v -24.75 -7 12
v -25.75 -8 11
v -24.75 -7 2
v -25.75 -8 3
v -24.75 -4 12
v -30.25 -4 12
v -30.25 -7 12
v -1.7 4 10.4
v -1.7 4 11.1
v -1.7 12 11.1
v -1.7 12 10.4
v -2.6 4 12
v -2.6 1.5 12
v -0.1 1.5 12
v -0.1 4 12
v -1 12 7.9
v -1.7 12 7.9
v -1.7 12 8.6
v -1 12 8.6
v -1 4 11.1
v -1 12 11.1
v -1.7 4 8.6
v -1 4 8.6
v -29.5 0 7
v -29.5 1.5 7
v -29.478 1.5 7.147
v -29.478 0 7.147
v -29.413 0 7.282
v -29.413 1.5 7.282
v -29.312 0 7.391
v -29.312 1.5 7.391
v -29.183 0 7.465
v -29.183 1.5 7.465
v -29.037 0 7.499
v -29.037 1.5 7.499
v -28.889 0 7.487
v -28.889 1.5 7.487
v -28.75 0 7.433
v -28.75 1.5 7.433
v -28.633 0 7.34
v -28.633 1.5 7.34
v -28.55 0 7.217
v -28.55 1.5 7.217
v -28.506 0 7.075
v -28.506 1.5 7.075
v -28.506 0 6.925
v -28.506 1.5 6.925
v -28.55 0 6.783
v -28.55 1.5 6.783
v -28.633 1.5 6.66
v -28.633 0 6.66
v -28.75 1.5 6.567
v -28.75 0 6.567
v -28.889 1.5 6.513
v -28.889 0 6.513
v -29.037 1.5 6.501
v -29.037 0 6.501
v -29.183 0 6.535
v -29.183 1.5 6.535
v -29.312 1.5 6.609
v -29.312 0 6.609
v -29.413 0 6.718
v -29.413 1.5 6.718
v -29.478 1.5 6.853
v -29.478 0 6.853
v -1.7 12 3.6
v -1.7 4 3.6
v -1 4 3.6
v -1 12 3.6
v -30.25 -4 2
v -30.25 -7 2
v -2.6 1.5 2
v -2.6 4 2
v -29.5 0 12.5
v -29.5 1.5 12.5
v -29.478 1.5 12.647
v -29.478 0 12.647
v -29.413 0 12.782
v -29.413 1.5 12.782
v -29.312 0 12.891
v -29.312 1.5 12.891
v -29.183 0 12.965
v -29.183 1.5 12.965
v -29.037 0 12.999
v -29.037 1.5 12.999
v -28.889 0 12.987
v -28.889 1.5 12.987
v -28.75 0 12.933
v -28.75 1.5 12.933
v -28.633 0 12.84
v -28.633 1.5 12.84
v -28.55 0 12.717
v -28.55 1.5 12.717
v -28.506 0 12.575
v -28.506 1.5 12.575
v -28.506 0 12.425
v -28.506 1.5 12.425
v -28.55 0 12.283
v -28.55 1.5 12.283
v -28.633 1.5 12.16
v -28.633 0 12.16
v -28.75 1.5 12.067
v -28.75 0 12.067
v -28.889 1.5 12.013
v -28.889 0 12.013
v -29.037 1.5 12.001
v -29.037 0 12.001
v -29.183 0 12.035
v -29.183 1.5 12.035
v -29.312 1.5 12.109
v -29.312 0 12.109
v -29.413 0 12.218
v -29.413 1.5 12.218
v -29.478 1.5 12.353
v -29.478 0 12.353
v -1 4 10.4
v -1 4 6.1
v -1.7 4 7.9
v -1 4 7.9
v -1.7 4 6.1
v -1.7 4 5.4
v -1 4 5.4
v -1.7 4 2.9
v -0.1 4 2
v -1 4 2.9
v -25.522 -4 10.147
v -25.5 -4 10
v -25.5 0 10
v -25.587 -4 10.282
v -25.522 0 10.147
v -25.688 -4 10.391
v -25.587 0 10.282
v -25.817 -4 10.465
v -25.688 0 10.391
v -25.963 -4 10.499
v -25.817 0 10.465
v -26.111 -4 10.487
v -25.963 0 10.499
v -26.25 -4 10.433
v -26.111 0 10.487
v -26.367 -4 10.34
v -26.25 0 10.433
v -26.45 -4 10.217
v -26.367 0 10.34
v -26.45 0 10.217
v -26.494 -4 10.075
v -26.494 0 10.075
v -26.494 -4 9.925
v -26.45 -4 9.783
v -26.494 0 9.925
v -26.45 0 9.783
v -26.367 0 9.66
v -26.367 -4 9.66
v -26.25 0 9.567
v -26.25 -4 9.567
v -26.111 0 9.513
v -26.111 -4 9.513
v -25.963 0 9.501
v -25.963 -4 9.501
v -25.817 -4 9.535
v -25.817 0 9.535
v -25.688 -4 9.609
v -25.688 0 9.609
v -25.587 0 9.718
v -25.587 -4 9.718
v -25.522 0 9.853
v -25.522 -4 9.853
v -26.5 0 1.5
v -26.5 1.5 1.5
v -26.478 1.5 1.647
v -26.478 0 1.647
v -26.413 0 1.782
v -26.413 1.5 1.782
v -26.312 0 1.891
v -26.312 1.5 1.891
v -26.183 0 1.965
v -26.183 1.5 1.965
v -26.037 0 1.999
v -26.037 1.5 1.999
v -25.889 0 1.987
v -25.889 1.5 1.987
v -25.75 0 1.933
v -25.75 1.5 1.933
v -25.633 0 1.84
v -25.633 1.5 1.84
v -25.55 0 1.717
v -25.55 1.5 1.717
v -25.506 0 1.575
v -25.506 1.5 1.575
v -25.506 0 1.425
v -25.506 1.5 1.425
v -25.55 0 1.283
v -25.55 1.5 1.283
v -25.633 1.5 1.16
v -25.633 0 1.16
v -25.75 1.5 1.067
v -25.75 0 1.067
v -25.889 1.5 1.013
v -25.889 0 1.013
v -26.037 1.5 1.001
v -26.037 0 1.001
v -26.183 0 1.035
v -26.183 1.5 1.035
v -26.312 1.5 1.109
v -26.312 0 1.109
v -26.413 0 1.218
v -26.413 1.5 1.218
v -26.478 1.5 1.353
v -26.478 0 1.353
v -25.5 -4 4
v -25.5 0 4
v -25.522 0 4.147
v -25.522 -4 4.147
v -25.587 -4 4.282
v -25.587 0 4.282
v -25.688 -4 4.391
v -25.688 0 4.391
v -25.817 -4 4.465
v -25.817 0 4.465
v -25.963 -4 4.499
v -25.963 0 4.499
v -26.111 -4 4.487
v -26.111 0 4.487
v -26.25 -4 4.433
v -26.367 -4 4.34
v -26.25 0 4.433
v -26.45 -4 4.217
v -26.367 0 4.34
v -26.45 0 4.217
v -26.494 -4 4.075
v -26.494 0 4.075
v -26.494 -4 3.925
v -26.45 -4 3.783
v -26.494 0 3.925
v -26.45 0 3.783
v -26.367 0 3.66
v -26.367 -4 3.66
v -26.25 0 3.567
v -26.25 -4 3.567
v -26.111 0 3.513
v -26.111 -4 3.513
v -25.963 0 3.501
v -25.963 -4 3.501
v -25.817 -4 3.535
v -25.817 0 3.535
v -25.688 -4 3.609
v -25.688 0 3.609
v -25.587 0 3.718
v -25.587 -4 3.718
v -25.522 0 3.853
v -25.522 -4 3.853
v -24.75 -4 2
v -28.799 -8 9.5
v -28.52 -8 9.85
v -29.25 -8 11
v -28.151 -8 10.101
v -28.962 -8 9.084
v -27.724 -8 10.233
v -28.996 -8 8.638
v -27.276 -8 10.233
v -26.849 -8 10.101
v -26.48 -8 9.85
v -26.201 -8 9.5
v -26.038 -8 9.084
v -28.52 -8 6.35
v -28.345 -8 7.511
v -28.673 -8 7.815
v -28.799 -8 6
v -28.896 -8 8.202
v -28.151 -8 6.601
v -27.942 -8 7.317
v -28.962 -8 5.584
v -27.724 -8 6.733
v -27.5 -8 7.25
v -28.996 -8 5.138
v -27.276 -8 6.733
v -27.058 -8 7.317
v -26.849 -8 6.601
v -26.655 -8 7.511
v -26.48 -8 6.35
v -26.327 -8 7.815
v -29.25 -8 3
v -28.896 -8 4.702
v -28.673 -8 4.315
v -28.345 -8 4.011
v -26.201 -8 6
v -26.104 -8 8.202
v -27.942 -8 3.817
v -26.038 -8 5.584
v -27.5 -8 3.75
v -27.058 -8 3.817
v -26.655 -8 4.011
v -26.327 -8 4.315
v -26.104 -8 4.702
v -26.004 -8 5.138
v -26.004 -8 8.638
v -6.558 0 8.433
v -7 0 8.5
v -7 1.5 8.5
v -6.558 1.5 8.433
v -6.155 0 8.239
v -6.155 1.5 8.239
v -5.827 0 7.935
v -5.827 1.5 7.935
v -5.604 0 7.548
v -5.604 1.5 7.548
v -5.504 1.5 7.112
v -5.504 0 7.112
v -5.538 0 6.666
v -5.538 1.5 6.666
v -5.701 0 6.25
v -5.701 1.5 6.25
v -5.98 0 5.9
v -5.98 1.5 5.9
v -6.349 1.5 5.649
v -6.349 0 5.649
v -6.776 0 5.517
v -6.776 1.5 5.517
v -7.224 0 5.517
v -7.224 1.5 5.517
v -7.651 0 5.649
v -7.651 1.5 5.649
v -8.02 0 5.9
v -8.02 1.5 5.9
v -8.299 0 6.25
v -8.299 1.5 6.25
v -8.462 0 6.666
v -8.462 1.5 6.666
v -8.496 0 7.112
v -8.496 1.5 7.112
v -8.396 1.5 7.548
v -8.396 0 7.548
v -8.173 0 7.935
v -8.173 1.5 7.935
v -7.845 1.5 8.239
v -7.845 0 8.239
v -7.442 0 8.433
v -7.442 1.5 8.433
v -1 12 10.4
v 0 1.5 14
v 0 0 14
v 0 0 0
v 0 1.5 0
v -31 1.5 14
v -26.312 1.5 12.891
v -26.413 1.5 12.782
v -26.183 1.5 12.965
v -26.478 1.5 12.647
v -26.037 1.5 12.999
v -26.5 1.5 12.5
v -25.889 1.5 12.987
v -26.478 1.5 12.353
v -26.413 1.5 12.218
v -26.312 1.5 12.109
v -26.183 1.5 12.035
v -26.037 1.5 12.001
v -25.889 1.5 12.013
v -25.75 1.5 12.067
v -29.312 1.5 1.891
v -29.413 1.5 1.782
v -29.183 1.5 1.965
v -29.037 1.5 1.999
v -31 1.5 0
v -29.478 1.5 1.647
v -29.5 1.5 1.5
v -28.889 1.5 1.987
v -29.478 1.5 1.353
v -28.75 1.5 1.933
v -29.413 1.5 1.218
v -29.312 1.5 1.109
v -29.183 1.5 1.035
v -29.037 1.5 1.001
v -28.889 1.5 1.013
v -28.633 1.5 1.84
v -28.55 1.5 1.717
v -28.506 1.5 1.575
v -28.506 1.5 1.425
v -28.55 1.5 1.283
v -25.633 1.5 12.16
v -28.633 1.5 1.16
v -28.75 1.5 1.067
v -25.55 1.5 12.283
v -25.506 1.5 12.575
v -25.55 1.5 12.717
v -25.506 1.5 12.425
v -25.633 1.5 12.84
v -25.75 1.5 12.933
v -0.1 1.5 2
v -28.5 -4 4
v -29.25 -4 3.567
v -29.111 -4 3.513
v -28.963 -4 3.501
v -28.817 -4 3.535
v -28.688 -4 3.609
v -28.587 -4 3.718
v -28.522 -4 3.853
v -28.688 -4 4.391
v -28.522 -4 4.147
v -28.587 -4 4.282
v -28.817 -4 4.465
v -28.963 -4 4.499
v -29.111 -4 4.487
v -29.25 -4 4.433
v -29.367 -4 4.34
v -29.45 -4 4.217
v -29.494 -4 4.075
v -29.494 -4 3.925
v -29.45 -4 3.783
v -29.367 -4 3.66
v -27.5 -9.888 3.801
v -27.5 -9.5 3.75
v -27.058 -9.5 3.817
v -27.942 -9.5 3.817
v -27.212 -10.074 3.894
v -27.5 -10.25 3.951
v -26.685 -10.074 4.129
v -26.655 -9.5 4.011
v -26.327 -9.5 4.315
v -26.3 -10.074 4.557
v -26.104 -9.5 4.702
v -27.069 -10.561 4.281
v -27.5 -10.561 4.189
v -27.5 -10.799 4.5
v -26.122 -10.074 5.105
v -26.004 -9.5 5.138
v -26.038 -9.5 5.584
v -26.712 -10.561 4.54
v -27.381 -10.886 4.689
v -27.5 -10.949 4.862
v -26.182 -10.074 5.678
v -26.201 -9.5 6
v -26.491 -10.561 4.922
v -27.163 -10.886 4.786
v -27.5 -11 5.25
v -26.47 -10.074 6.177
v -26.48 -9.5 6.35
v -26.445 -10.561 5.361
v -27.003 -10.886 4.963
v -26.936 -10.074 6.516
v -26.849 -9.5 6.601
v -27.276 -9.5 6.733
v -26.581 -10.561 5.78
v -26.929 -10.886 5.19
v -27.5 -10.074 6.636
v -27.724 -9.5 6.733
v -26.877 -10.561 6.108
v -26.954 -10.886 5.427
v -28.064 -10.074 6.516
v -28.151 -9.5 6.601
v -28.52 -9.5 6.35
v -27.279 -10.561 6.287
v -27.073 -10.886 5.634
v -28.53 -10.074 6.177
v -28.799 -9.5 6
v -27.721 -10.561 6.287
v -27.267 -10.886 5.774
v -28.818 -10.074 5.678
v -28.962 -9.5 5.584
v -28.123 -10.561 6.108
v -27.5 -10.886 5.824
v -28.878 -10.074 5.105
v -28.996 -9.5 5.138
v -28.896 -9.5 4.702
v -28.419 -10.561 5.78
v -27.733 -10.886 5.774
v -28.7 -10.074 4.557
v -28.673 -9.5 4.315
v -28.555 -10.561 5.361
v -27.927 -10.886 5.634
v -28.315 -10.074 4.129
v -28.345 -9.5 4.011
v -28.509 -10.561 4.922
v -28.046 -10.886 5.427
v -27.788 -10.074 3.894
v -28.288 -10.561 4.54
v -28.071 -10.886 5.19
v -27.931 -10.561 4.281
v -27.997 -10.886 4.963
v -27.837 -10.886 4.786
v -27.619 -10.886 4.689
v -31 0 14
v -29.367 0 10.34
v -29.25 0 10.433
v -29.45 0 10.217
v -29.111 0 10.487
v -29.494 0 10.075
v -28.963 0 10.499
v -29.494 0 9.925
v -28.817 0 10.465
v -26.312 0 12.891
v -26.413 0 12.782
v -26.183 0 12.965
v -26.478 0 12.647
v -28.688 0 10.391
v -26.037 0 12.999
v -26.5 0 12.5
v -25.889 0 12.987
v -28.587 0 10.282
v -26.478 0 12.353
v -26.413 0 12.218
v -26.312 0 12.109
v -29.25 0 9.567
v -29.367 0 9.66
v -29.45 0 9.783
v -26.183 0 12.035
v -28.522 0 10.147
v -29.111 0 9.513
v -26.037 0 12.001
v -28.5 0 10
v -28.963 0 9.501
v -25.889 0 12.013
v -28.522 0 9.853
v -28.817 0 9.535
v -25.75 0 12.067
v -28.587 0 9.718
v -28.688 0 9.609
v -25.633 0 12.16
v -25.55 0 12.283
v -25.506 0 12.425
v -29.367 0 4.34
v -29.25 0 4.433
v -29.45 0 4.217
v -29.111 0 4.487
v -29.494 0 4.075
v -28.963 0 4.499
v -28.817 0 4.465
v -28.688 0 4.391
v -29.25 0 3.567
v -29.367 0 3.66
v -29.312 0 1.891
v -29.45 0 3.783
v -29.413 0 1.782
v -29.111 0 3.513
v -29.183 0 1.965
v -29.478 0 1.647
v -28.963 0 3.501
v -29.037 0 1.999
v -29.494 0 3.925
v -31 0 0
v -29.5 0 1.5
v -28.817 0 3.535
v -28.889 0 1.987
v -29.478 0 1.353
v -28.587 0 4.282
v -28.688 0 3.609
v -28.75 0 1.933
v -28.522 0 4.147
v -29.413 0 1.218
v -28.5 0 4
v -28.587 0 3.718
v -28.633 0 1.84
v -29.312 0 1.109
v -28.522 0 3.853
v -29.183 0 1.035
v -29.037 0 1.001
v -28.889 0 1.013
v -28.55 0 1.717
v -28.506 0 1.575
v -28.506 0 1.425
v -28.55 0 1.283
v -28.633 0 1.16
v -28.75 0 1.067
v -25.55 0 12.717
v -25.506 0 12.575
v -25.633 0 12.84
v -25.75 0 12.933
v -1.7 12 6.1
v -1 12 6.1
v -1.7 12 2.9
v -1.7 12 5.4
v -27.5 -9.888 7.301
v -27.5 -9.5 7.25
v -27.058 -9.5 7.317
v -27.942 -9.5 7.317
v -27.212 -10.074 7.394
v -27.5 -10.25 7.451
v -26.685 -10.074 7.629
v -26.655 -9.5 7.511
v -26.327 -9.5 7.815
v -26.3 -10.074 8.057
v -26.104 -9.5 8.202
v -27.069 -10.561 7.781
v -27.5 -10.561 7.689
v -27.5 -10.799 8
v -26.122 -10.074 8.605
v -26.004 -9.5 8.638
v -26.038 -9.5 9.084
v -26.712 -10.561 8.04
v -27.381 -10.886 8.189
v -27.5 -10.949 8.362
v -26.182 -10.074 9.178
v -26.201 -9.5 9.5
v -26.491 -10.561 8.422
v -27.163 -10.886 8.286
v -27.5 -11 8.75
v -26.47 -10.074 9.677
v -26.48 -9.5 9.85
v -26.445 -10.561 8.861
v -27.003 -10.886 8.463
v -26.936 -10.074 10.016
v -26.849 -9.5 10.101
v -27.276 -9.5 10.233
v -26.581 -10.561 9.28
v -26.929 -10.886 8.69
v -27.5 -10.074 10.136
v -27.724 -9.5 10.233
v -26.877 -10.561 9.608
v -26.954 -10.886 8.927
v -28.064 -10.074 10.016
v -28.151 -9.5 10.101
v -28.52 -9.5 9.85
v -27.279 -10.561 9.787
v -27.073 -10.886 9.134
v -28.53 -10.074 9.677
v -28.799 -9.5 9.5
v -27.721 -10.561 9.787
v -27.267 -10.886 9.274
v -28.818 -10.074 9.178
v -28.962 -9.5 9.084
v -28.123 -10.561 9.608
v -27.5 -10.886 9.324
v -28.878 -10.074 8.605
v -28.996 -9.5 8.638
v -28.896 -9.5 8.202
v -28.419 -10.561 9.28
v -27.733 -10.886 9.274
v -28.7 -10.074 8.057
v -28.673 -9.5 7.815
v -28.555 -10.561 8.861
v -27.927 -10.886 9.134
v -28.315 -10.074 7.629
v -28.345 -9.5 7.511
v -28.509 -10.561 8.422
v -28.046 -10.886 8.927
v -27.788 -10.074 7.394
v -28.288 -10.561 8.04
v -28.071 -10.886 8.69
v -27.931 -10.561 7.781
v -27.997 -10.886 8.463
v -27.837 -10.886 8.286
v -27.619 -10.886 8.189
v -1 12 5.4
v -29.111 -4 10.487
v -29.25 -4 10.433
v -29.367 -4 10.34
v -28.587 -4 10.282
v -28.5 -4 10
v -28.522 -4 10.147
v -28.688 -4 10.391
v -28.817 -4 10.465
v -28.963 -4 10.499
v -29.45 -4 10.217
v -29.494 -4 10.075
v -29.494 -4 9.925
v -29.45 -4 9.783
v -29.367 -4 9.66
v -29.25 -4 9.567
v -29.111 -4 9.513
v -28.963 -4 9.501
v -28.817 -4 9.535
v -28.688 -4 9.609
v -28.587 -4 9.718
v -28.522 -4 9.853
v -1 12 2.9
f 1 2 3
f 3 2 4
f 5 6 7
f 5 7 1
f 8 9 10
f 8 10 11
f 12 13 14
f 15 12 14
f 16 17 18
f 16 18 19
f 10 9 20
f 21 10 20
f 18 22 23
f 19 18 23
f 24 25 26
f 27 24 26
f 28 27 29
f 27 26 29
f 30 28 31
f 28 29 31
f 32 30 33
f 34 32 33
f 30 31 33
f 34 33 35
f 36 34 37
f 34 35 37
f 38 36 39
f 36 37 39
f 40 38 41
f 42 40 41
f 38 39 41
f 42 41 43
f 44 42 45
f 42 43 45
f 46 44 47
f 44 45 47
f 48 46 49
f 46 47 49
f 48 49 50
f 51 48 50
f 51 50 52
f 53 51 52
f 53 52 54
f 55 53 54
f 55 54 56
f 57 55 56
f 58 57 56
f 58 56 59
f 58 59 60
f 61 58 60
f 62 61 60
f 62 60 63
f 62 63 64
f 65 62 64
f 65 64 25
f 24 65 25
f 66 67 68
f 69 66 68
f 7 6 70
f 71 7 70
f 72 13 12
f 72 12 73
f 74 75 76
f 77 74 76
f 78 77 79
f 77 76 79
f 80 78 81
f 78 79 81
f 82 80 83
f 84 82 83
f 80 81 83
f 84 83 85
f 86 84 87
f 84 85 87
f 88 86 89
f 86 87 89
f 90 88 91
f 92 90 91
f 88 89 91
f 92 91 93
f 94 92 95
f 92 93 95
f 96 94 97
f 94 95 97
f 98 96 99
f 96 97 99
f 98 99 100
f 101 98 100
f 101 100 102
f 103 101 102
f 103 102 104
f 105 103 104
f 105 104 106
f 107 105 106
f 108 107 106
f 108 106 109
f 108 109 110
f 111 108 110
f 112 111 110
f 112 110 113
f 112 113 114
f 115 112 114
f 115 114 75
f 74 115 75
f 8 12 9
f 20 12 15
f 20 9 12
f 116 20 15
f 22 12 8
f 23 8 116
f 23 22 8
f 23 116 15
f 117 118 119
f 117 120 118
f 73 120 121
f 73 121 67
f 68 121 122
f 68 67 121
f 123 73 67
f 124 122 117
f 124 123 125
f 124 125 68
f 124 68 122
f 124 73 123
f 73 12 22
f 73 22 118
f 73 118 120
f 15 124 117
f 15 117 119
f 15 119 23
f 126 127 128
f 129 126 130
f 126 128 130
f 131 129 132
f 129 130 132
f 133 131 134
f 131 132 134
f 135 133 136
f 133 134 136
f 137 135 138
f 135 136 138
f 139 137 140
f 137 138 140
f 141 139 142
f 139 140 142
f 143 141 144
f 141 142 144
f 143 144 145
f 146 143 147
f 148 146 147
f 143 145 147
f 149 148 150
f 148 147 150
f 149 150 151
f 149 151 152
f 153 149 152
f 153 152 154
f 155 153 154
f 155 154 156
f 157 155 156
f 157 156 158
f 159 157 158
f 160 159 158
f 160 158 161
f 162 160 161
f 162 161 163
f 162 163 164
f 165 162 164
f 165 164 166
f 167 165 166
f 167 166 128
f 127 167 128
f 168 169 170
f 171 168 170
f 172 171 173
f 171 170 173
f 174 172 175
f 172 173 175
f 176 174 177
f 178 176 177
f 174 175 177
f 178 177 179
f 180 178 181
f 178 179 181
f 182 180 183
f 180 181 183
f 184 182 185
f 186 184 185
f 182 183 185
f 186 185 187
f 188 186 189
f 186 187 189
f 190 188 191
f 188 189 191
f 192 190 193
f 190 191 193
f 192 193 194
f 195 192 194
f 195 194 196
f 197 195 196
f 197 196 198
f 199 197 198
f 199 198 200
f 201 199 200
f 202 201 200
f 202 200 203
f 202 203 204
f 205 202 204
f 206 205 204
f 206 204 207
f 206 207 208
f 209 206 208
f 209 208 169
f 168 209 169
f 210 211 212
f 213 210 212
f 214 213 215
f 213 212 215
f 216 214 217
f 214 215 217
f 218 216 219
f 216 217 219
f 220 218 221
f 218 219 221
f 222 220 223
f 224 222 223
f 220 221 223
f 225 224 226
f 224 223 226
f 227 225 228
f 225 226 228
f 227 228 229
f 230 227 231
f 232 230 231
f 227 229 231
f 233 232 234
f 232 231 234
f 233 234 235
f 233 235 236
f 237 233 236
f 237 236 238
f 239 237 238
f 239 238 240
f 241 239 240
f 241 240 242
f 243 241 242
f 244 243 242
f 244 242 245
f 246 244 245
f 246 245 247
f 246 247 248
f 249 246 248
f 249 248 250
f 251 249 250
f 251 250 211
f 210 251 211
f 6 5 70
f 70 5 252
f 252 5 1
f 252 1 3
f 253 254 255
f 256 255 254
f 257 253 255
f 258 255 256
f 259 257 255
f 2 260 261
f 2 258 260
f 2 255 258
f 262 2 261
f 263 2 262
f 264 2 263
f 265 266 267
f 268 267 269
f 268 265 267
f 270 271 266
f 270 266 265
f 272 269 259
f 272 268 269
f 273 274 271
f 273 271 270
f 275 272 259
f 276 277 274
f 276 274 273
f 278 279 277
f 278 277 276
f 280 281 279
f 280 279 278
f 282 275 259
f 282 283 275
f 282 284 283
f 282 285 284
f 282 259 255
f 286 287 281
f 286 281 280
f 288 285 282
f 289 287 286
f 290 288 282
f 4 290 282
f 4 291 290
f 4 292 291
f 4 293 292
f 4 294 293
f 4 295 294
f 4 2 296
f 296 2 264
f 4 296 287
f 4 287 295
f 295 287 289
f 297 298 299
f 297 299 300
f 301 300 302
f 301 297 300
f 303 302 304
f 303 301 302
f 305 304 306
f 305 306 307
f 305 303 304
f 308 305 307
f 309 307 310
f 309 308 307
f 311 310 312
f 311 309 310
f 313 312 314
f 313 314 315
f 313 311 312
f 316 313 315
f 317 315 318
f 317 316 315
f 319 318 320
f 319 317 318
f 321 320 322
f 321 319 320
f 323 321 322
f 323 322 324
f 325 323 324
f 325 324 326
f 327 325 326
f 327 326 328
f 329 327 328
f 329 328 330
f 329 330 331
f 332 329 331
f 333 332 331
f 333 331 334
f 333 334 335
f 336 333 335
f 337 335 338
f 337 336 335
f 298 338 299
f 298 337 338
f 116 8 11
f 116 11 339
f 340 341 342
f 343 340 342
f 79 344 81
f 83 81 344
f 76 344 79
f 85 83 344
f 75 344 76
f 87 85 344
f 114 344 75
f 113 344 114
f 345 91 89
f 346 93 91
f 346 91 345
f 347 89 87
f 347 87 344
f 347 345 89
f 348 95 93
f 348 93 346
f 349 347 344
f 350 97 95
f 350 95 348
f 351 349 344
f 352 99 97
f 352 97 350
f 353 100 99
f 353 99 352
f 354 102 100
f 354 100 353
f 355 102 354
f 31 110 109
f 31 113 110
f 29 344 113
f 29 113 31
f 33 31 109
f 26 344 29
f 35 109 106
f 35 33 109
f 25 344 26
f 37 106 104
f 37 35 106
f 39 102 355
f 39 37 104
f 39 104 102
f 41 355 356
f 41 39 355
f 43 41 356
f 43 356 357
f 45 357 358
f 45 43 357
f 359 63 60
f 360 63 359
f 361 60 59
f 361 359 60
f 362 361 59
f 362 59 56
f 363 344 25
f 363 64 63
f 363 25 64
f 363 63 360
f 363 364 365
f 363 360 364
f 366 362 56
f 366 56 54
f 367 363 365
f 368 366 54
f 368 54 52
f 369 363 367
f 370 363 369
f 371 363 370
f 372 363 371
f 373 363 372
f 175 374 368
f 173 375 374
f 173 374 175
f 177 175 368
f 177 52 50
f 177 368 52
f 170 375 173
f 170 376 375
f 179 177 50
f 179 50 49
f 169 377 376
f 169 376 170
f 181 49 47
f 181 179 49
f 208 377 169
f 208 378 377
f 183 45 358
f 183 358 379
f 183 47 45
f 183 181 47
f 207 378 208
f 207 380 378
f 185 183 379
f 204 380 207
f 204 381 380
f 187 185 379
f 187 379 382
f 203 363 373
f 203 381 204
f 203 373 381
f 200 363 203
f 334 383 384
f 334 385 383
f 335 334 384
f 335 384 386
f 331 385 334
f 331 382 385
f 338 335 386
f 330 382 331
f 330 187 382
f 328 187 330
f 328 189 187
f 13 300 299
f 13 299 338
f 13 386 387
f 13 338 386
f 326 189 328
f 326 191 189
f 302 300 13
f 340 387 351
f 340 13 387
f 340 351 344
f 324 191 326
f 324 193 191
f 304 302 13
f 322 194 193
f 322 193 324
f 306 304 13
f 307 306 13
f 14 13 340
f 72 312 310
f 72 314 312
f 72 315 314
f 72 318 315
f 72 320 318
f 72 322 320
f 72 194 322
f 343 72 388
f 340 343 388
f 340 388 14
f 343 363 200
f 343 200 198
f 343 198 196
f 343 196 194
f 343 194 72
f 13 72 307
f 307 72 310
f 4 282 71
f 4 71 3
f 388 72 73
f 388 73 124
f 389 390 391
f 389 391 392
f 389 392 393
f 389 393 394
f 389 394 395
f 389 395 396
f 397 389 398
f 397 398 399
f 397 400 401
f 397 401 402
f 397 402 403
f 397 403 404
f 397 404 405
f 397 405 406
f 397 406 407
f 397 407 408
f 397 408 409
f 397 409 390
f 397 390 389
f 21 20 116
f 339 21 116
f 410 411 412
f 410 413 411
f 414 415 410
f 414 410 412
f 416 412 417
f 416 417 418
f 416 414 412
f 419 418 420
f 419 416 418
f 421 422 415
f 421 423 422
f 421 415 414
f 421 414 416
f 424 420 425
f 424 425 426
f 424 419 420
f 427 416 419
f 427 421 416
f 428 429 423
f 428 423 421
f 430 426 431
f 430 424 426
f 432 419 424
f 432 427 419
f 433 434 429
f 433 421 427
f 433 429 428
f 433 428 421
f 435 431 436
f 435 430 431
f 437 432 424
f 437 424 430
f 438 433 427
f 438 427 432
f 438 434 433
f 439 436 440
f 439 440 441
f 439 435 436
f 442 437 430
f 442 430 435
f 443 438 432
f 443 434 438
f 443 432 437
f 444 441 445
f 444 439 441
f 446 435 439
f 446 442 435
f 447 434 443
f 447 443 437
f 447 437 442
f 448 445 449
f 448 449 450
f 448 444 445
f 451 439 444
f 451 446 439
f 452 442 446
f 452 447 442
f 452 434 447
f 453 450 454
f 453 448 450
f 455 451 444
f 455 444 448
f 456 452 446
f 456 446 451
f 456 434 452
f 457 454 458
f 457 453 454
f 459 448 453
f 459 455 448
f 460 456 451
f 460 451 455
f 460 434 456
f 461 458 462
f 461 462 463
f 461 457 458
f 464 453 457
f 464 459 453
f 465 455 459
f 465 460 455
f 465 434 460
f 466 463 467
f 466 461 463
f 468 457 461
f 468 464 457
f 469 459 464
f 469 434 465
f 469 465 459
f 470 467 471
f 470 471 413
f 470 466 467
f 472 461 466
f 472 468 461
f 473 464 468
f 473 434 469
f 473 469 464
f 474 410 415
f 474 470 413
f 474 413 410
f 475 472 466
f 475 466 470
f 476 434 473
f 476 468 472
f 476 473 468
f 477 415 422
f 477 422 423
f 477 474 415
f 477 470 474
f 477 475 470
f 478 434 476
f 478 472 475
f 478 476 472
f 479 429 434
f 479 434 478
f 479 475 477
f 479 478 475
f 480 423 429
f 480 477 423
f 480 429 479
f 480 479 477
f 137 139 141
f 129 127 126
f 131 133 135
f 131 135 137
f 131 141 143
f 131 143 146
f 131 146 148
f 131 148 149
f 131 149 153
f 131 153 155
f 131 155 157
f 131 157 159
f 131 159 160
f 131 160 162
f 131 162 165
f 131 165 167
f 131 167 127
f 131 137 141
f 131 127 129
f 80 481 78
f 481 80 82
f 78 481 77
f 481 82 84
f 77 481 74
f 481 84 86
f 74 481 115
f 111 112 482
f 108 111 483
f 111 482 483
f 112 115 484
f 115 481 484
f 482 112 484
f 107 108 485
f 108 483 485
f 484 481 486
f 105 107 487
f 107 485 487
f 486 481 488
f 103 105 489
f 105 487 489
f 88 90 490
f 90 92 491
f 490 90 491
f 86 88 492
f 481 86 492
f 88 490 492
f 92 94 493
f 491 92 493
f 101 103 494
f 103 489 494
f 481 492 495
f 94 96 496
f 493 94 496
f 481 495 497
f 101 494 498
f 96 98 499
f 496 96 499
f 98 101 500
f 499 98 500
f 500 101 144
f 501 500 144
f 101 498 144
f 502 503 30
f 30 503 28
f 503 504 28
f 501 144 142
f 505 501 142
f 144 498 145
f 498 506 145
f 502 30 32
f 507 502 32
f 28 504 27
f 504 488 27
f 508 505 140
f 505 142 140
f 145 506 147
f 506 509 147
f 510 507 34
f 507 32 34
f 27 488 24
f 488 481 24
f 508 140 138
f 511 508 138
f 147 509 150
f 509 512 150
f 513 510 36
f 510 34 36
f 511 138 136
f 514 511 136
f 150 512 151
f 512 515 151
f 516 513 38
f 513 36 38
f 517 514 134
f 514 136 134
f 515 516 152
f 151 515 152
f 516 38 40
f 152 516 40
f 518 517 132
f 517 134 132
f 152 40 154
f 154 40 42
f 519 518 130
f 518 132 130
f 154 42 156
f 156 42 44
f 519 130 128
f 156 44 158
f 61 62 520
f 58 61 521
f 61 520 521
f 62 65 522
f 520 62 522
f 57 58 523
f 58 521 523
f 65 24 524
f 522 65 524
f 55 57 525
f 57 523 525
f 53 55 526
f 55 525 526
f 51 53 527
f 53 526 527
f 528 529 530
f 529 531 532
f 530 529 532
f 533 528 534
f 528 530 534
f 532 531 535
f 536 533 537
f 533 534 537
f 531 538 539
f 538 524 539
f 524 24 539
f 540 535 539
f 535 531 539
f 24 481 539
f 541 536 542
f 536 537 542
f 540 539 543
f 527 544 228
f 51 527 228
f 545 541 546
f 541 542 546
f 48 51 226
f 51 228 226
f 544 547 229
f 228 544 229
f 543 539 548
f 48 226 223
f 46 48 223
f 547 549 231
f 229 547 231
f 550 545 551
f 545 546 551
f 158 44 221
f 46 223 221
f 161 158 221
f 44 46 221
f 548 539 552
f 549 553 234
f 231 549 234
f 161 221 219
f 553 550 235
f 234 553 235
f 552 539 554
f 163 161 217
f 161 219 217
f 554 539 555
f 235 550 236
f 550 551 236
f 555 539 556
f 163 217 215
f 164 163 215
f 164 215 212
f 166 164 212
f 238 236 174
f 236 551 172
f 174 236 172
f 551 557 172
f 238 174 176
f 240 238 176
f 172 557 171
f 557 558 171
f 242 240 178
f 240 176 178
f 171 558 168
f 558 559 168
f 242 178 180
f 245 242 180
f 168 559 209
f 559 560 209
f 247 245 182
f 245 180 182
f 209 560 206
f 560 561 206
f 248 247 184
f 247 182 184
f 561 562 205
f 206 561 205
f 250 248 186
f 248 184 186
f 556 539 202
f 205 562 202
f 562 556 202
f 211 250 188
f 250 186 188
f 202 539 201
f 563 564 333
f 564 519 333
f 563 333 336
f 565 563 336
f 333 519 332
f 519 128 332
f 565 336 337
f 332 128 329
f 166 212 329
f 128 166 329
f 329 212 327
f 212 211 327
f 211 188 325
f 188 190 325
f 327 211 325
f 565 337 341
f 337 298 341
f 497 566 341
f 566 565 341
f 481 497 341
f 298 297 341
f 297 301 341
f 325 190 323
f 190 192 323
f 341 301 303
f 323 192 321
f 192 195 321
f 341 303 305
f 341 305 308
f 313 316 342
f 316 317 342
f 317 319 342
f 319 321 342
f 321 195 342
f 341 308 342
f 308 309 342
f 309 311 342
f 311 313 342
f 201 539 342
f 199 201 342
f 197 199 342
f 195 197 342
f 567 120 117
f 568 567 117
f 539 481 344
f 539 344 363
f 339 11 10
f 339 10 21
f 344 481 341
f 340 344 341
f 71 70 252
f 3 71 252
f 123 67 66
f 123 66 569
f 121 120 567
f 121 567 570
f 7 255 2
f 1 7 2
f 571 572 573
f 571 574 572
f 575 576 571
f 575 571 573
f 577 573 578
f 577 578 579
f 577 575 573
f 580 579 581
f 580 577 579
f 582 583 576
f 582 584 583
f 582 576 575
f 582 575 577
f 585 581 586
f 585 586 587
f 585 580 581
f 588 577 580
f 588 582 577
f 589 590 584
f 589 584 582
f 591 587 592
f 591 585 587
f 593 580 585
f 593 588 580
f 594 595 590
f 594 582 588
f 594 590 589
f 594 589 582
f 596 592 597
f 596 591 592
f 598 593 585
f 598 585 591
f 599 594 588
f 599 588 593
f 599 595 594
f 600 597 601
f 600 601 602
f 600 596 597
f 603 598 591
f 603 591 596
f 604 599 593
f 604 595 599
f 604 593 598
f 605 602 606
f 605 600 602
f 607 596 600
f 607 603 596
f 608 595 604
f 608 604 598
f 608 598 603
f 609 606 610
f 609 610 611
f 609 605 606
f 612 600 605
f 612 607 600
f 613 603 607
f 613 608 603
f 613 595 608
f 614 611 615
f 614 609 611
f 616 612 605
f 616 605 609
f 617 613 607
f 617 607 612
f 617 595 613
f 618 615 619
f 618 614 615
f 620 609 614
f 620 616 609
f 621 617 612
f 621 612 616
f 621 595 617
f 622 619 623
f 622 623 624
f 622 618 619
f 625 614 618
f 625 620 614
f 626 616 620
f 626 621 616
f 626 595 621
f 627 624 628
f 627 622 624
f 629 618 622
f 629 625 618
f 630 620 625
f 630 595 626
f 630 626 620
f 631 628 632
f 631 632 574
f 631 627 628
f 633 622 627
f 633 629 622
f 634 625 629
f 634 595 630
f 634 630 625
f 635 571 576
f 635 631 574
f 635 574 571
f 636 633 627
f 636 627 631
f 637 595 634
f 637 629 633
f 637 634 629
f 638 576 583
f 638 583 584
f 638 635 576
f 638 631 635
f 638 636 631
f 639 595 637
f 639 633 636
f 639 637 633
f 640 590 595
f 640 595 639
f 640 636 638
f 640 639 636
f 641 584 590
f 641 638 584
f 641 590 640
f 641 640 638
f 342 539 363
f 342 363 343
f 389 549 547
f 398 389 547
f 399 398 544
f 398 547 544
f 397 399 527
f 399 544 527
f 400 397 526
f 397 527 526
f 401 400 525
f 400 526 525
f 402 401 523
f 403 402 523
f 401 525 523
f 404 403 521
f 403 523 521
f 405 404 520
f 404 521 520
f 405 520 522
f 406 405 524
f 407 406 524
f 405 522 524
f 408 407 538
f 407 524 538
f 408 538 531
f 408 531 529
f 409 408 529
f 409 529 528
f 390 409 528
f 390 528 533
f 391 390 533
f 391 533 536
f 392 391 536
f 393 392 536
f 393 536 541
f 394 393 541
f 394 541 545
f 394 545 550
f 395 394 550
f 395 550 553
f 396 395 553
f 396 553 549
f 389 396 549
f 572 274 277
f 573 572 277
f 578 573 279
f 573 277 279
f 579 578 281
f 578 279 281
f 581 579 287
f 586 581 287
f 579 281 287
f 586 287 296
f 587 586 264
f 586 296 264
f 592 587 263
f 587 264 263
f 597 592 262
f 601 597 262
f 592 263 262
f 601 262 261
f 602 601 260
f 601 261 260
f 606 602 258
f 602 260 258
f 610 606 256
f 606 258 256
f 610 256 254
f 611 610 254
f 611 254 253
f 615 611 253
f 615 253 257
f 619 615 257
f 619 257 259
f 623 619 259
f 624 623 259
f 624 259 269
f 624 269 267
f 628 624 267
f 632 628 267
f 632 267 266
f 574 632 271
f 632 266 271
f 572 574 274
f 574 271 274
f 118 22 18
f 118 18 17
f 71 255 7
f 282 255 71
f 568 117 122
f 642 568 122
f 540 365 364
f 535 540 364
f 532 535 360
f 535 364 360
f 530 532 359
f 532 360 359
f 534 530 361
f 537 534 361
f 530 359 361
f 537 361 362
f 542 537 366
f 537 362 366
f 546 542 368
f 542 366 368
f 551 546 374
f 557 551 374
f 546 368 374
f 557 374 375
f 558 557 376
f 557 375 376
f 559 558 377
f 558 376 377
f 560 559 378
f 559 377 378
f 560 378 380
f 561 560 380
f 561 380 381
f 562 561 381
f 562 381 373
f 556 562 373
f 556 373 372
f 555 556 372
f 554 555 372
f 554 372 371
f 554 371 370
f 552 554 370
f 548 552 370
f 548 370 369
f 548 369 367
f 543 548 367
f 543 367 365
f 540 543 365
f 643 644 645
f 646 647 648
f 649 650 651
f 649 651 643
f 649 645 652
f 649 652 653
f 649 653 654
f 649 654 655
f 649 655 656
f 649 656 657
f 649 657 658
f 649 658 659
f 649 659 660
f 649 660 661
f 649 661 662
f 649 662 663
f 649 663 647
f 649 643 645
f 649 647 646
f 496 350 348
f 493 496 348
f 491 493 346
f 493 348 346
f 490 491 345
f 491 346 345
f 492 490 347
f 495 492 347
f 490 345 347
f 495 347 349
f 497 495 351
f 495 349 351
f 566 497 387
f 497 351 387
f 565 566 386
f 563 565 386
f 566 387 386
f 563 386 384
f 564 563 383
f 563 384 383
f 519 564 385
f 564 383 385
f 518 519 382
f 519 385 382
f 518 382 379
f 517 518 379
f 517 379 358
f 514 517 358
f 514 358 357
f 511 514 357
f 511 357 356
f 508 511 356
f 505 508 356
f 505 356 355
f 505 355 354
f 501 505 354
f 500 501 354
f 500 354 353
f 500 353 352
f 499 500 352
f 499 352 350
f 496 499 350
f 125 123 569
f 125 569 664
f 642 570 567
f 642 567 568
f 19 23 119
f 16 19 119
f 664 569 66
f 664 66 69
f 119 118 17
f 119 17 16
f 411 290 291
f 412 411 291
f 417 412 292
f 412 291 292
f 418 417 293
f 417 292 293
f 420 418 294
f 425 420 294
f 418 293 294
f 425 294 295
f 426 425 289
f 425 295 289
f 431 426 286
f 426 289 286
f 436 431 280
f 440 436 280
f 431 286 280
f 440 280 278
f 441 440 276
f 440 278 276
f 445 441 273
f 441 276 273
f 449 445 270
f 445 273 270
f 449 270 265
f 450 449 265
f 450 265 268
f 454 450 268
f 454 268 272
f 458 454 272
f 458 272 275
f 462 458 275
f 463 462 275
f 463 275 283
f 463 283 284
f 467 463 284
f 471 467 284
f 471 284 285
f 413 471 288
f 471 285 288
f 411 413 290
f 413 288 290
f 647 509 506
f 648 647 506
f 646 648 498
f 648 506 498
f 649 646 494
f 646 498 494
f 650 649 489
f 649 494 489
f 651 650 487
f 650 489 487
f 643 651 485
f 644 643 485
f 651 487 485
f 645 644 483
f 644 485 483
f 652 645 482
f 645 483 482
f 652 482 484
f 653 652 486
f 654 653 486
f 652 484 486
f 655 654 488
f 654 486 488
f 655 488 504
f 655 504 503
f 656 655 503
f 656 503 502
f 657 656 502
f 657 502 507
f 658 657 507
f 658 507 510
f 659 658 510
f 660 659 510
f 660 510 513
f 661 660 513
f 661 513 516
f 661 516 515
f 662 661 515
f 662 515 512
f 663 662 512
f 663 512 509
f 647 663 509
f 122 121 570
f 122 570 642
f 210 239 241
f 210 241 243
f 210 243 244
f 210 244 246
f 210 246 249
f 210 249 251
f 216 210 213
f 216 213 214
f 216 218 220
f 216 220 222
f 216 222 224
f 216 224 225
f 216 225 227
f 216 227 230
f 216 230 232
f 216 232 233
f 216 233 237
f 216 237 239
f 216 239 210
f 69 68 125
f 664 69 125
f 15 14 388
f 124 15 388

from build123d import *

# Parameters (mm, degrees)
SKETCH1_W            = 31
SKETCH1_H            = 14
SKETCH1_R            = 1.5
BOSS_EXTRUDE1_DEPTH  = 1.5
SKETCH2_W            = 2.5
SKETCH2_H            = 10
BOSS_EXTRUDE2_DEPTH  = 2.5
SKETCH3_W            = 0.7
SKETCH3_H            = 0.7
BOSS_EXTRUDE3_DEPTH  = 8
CUT_EXTRUDE3_REACH   = 37.598
SKETCH13_R           = 0.5
SKETCH14_W           = 10
SKETCH14_H           = 5.5
BOSS_EXTRUDE10_DEPTH = 4
CHAMFER1_SIZE        = 1
SKETCH15_R           = 1.5
BOSS_EXTRUDE11_DEPTH = 3
SKETCH15_2_R         = 1.5
BOSS_EXTRUDE12_DEPTH = 2
FILLET3_R            = 1.5
FILLET4_R            = 1.5
BOSS_EXTRUDE13_START = -5.5
SKETCH16_R           = 0.5
BOSS_EXTRUDE13_DEPTH = 5.5


with BuildPart() as part:
    # Sketch1 → Boss-Extrude1 (new body)
    with BuildSketch(Plane(origin=(0, 0, 0), x_dir=(1, 0, 0), z_dir=(0, 1, 0))):
        with Locations((-15.5, -7)):
            Rectangle(SKETCH1_W, SKETCH1_H)
        with Locations((-7, -7)):
            Circle(SKETCH1_R, mode=Mode.SUBTRACT)
    extrude(amount=BOSS_EXTRUDE1_DEPTH)

    # Sketch2 → Boss-Extrude2 (add)
    with BuildSketch(Plane(origin=(0, 1.5, 0), x_dir=(1, 0, 0), z_dir=(0, 1, 0))):
        with Locations((-1.35, -7)):
            Rectangle(SKETCH2_W, SKETCH2_H)
    extrude(amount=BOSS_EXTRUDE2_DEPTH)

    # Sketch3 → Boss-Extrude3 (add)
    with BuildSketch(Plane(origin=(0, 4, 0), x_dir=(1, 0, 0), z_dir=(0, 1, 0))):
        with Locations((-1.35, -3.25)):
            Rectangle(SKETCH3_W, SKETCH3_H)
        with Locations((-1.35, -5.75)):
            Rectangle(SKETCH3_W, SKETCH3_H)
        with Locations((-1.35, -8.25)):
            Rectangle(SKETCH3_W, SKETCH3_H)
        with Locations((-1.35, -10.75)):
            Rectangle(SKETCH3_W, SKETCH3_H)
    extrude(amount=BOSS_EXTRUDE3_DEPTH)

    # Sketch13 → Cut-Extrude3 (cut, up to next)
    with BuildSketch(Plane.ZX.offset(1.5), mode=Mode.PRIVATE) as cut_extrude3_sk1:
        with Locations((12.5, -29)):
            Circle(SKETCH13_R)
    cut_extrude3_tool1 = extrude(cut_extrude3_sk1.sketch, amount=-CUT_EXTRUDE3_REACH, mode=Mode.PRIVATE) & part.part
    # Sketch13 → Cut-Extrude3 (cut, up to next)
    with BuildSketch(Plane.ZX.offset(1.5), mode=Mode.PRIVATE) as cut_extrude3_sk2:
        with Locations((12.5, -26)):
            Circle(SKETCH13_R)
    cut_extrude3_tool2 = extrude(cut_extrude3_sk2.sketch, amount=-CUT_EXTRUDE3_REACH, mode=Mode.PRIVATE) & part.part
    # Sketch13 → Cut-Extrude3 (cut, up to next)
    with BuildSketch(Plane.ZX.offset(1.5), mode=Mode.PRIVATE) as cut_extrude3_sk3:
        with Locations((10, -26)):
            Circle(SKETCH13_R)
    cut_extrude3_tool3 = extrude(cut_extrude3_sk3.sketch, amount=-CUT_EXTRUDE3_REACH, mode=Mode.PRIVATE) & part.part
    # Sketch13 → Cut-Extrude3 (cut, up to next)
    with BuildSketch(Plane.ZX.offset(1.5), mode=Mode.PRIVATE) as cut_extrude3_sk4:
        with Locations((10, -29)):
            Circle(SKETCH13_R)
    cut_extrude3_tool4 = extrude(cut_extrude3_sk4.sketch, amount=-CUT_EXTRUDE3_REACH, mode=Mode.PRIVATE) & part.part
    # Sketch13 → Cut-Extrude3 (cut, up to next)
    with BuildSketch(Plane.ZX.offset(1.5), mode=Mode.PRIVATE) as cut_extrude3_sk5:
        with Locations((7, -29)):
            Circle(SKETCH13_R)
    cut_extrude3_tool5 = extrude(cut_extrude3_sk5.sketch, amount=-CUT_EXTRUDE3_REACH, mode=Mode.PRIVATE) & part.part
    # Sketch13 → Cut-Extrude3 (cut, up to next)
    with BuildSketch(Plane.ZX.offset(1.5), mode=Mode.PRIVATE) as cut_extrude3_sk6:
        with Locations((4, -29)):
            Circle(SKETCH13_R)
    cut_extrude3_tool6 = extrude(cut_extrude3_sk6.sketch, amount=-CUT_EXTRUDE3_REACH, mode=Mode.PRIVATE) & part.part
    # Sketch13 → Cut-Extrude3 (cut, up to next)
    with BuildSketch(Plane.ZX.offset(1.5), mode=Mode.PRIVATE) as cut_extrude3_sk7:
        with Locations((1.5, -29)):
            Circle(SKETCH13_R)
    cut_extrude3_tool7 = extrude(cut_extrude3_sk7.sketch, amount=-CUT_EXTRUDE3_REACH, mode=Mode.PRIVATE) & part.part
    # Sketch13 → Cut-Extrude3 (cut, up to next)
    with BuildSketch(Plane.ZX.offset(1.5), mode=Mode.PRIVATE) as cut_extrude3_sk8:
        with Locations((4, -26)):
            Circle(SKETCH13_R)
    cut_extrude3_tool8 = extrude(cut_extrude3_sk8.sketch, amount=-CUT_EXTRUDE3_REACH, mode=Mode.PRIVATE) & part.part
    # Sketch13 → Cut-Extrude3 (cut, up to next)
    with BuildSketch(Plane.ZX.offset(1.5), mode=Mode.PRIVATE) as cut_extrude3_sk9:
        with Locations((1.5, -26)):
            Circle(SKETCH13_R)
    cut_extrude3_tool9 = extrude(cut_extrude3_sk9.sketch, amount=-CUT_EXTRUDE3_REACH, mode=Mode.PRIVATE) & part.part
    add(cut_extrude3_tool1.solids().sort_by_distance((-29, 1.5, 12.5))[0], mode=Mode.SUBTRACT)
    add(cut_extrude3_tool2.solids().sort_by_distance((-26, 1.5, 12.5))[0], mode=Mode.SUBTRACT)
    add(cut_extrude3_tool3.solids().sort_by_distance((-26, 1.5, 10))[0], mode=Mode.SUBTRACT)
    add(cut_extrude3_tool4.solids().sort_by_distance((-29, 1.5, 10))[0], mode=Mode.SUBTRACT)
    add(cut_extrude3_tool5.solids().sort_by_distance((-29, 1.5, 7))[0], mode=Mode.SUBTRACT)
    add(cut_extrude3_tool6.solids().sort_by_distance((-29, 1.5, 4))[0], mode=Mode.SUBTRACT)
    add(cut_extrude3_tool7.solids().sort_by_distance((-29, 1.5, 1.5))[0], mode=Mode.SUBTRACT)
    add(cut_extrude3_tool8.solids().sort_by_distance((-26, 1.5, 4))[0], mode=Mode.SUBTRACT)
    add(cut_extrude3_tool9.solids().sort_by_distance((-26, 1.5, 1.5))[0], mode=Mode.SUBTRACT)

    # Sketch16 → Boss-Extrude13 (add)
    with BuildSketch(Plane(origin=(0, -4, 0), x_dir=(0, 0, -1), z_dir=(0, -1, 0)).offset(BOSS_EXTRUDE13_START)):
        with Locations((-10, -26)):
            Circle(SKETCH16_R)
        with Locations((-4, -29)):
            Circle(SKETCH16_R)
        with Locations((-4, -26)):
            Circle(SKETCH16_R)
        with Locations((-10, -29)):
            Circle(SKETCH16_R)
    extrude(amount=BOSS_EXTRUDE13_DEPTH)


with BuildPart() as body_2:
    # Sketch14 → Boss-Extrude10 (new body)
    with BuildSketch(Plane(origin=(0, -4, 0), x_dir=(0, 0, -1), z_dir=(0, -1, 0))):
        with Locations((-7, -27.5)):
            Rectangle(SKETCH14_W, SKETCH14_H)
    extrude(amount=BOSS_EXTRUDE10_DEPTH)

    # Chamfer1
    chamfer1_edges = [body_2.edges().sort_by_distance(p)[0] for p in [
        (-27.5, -8, 2),
        (-30.25, -8, 7),
        (-27.5, -8, 12),
        (-24.75, -8, 7),
    ]]
    chamfer(chamfer1_edges, length=CHAMFER1_SIZE)

    # Sketch15 → Boss-Extrude11 (add)
    with BuildSketch(Plane(origin=(0, -8, 0), x_dir=(0, 0, -1), z_dir=(0, -1, 0))):
        with Locations((-8.75, -27.5)):
            Circle(SKETCH15_R)
        with Locations((-5.25, -27.5)):
            Circle(SKETCH15_R)
    extrude(amount=BOSS_EXTRUDE11_DEPTH)

    # Sketch15<2> → Boss-Extrude12 (add)
    with BuildSketch(Plane(origin=(0, -8, 0), x_dir=(0, 0, -1), z_dir=(0, -1, 0))):
        with Locations((-8.75, -27.5)):
            Circle(SKETCH15_2_R)
        with Locations((-5.25, -27.5)):
            Circle(SKETCH15_2_R)
    extrude(amount=-BOSS_EXTRUDE12_DEPTH)

    # Fillet3
    fillet3_edges = [body_2.edges().sort_by_distance(p)[0] for p in [
        (-27.5, -11, 10.25),
    ]]
    fillet(fillet3_edges, radius=FILLET3_R)

    # Fillet4
    fillet4_edges = [body_2.edges().sort_by_distance(p)[0] for p in [
        (-27.5, -11, 6.75),
    ]]
    fillet(fillet4_edges, radius=FILLET4_R)


solid = Compound([part.part, body_2.part])
